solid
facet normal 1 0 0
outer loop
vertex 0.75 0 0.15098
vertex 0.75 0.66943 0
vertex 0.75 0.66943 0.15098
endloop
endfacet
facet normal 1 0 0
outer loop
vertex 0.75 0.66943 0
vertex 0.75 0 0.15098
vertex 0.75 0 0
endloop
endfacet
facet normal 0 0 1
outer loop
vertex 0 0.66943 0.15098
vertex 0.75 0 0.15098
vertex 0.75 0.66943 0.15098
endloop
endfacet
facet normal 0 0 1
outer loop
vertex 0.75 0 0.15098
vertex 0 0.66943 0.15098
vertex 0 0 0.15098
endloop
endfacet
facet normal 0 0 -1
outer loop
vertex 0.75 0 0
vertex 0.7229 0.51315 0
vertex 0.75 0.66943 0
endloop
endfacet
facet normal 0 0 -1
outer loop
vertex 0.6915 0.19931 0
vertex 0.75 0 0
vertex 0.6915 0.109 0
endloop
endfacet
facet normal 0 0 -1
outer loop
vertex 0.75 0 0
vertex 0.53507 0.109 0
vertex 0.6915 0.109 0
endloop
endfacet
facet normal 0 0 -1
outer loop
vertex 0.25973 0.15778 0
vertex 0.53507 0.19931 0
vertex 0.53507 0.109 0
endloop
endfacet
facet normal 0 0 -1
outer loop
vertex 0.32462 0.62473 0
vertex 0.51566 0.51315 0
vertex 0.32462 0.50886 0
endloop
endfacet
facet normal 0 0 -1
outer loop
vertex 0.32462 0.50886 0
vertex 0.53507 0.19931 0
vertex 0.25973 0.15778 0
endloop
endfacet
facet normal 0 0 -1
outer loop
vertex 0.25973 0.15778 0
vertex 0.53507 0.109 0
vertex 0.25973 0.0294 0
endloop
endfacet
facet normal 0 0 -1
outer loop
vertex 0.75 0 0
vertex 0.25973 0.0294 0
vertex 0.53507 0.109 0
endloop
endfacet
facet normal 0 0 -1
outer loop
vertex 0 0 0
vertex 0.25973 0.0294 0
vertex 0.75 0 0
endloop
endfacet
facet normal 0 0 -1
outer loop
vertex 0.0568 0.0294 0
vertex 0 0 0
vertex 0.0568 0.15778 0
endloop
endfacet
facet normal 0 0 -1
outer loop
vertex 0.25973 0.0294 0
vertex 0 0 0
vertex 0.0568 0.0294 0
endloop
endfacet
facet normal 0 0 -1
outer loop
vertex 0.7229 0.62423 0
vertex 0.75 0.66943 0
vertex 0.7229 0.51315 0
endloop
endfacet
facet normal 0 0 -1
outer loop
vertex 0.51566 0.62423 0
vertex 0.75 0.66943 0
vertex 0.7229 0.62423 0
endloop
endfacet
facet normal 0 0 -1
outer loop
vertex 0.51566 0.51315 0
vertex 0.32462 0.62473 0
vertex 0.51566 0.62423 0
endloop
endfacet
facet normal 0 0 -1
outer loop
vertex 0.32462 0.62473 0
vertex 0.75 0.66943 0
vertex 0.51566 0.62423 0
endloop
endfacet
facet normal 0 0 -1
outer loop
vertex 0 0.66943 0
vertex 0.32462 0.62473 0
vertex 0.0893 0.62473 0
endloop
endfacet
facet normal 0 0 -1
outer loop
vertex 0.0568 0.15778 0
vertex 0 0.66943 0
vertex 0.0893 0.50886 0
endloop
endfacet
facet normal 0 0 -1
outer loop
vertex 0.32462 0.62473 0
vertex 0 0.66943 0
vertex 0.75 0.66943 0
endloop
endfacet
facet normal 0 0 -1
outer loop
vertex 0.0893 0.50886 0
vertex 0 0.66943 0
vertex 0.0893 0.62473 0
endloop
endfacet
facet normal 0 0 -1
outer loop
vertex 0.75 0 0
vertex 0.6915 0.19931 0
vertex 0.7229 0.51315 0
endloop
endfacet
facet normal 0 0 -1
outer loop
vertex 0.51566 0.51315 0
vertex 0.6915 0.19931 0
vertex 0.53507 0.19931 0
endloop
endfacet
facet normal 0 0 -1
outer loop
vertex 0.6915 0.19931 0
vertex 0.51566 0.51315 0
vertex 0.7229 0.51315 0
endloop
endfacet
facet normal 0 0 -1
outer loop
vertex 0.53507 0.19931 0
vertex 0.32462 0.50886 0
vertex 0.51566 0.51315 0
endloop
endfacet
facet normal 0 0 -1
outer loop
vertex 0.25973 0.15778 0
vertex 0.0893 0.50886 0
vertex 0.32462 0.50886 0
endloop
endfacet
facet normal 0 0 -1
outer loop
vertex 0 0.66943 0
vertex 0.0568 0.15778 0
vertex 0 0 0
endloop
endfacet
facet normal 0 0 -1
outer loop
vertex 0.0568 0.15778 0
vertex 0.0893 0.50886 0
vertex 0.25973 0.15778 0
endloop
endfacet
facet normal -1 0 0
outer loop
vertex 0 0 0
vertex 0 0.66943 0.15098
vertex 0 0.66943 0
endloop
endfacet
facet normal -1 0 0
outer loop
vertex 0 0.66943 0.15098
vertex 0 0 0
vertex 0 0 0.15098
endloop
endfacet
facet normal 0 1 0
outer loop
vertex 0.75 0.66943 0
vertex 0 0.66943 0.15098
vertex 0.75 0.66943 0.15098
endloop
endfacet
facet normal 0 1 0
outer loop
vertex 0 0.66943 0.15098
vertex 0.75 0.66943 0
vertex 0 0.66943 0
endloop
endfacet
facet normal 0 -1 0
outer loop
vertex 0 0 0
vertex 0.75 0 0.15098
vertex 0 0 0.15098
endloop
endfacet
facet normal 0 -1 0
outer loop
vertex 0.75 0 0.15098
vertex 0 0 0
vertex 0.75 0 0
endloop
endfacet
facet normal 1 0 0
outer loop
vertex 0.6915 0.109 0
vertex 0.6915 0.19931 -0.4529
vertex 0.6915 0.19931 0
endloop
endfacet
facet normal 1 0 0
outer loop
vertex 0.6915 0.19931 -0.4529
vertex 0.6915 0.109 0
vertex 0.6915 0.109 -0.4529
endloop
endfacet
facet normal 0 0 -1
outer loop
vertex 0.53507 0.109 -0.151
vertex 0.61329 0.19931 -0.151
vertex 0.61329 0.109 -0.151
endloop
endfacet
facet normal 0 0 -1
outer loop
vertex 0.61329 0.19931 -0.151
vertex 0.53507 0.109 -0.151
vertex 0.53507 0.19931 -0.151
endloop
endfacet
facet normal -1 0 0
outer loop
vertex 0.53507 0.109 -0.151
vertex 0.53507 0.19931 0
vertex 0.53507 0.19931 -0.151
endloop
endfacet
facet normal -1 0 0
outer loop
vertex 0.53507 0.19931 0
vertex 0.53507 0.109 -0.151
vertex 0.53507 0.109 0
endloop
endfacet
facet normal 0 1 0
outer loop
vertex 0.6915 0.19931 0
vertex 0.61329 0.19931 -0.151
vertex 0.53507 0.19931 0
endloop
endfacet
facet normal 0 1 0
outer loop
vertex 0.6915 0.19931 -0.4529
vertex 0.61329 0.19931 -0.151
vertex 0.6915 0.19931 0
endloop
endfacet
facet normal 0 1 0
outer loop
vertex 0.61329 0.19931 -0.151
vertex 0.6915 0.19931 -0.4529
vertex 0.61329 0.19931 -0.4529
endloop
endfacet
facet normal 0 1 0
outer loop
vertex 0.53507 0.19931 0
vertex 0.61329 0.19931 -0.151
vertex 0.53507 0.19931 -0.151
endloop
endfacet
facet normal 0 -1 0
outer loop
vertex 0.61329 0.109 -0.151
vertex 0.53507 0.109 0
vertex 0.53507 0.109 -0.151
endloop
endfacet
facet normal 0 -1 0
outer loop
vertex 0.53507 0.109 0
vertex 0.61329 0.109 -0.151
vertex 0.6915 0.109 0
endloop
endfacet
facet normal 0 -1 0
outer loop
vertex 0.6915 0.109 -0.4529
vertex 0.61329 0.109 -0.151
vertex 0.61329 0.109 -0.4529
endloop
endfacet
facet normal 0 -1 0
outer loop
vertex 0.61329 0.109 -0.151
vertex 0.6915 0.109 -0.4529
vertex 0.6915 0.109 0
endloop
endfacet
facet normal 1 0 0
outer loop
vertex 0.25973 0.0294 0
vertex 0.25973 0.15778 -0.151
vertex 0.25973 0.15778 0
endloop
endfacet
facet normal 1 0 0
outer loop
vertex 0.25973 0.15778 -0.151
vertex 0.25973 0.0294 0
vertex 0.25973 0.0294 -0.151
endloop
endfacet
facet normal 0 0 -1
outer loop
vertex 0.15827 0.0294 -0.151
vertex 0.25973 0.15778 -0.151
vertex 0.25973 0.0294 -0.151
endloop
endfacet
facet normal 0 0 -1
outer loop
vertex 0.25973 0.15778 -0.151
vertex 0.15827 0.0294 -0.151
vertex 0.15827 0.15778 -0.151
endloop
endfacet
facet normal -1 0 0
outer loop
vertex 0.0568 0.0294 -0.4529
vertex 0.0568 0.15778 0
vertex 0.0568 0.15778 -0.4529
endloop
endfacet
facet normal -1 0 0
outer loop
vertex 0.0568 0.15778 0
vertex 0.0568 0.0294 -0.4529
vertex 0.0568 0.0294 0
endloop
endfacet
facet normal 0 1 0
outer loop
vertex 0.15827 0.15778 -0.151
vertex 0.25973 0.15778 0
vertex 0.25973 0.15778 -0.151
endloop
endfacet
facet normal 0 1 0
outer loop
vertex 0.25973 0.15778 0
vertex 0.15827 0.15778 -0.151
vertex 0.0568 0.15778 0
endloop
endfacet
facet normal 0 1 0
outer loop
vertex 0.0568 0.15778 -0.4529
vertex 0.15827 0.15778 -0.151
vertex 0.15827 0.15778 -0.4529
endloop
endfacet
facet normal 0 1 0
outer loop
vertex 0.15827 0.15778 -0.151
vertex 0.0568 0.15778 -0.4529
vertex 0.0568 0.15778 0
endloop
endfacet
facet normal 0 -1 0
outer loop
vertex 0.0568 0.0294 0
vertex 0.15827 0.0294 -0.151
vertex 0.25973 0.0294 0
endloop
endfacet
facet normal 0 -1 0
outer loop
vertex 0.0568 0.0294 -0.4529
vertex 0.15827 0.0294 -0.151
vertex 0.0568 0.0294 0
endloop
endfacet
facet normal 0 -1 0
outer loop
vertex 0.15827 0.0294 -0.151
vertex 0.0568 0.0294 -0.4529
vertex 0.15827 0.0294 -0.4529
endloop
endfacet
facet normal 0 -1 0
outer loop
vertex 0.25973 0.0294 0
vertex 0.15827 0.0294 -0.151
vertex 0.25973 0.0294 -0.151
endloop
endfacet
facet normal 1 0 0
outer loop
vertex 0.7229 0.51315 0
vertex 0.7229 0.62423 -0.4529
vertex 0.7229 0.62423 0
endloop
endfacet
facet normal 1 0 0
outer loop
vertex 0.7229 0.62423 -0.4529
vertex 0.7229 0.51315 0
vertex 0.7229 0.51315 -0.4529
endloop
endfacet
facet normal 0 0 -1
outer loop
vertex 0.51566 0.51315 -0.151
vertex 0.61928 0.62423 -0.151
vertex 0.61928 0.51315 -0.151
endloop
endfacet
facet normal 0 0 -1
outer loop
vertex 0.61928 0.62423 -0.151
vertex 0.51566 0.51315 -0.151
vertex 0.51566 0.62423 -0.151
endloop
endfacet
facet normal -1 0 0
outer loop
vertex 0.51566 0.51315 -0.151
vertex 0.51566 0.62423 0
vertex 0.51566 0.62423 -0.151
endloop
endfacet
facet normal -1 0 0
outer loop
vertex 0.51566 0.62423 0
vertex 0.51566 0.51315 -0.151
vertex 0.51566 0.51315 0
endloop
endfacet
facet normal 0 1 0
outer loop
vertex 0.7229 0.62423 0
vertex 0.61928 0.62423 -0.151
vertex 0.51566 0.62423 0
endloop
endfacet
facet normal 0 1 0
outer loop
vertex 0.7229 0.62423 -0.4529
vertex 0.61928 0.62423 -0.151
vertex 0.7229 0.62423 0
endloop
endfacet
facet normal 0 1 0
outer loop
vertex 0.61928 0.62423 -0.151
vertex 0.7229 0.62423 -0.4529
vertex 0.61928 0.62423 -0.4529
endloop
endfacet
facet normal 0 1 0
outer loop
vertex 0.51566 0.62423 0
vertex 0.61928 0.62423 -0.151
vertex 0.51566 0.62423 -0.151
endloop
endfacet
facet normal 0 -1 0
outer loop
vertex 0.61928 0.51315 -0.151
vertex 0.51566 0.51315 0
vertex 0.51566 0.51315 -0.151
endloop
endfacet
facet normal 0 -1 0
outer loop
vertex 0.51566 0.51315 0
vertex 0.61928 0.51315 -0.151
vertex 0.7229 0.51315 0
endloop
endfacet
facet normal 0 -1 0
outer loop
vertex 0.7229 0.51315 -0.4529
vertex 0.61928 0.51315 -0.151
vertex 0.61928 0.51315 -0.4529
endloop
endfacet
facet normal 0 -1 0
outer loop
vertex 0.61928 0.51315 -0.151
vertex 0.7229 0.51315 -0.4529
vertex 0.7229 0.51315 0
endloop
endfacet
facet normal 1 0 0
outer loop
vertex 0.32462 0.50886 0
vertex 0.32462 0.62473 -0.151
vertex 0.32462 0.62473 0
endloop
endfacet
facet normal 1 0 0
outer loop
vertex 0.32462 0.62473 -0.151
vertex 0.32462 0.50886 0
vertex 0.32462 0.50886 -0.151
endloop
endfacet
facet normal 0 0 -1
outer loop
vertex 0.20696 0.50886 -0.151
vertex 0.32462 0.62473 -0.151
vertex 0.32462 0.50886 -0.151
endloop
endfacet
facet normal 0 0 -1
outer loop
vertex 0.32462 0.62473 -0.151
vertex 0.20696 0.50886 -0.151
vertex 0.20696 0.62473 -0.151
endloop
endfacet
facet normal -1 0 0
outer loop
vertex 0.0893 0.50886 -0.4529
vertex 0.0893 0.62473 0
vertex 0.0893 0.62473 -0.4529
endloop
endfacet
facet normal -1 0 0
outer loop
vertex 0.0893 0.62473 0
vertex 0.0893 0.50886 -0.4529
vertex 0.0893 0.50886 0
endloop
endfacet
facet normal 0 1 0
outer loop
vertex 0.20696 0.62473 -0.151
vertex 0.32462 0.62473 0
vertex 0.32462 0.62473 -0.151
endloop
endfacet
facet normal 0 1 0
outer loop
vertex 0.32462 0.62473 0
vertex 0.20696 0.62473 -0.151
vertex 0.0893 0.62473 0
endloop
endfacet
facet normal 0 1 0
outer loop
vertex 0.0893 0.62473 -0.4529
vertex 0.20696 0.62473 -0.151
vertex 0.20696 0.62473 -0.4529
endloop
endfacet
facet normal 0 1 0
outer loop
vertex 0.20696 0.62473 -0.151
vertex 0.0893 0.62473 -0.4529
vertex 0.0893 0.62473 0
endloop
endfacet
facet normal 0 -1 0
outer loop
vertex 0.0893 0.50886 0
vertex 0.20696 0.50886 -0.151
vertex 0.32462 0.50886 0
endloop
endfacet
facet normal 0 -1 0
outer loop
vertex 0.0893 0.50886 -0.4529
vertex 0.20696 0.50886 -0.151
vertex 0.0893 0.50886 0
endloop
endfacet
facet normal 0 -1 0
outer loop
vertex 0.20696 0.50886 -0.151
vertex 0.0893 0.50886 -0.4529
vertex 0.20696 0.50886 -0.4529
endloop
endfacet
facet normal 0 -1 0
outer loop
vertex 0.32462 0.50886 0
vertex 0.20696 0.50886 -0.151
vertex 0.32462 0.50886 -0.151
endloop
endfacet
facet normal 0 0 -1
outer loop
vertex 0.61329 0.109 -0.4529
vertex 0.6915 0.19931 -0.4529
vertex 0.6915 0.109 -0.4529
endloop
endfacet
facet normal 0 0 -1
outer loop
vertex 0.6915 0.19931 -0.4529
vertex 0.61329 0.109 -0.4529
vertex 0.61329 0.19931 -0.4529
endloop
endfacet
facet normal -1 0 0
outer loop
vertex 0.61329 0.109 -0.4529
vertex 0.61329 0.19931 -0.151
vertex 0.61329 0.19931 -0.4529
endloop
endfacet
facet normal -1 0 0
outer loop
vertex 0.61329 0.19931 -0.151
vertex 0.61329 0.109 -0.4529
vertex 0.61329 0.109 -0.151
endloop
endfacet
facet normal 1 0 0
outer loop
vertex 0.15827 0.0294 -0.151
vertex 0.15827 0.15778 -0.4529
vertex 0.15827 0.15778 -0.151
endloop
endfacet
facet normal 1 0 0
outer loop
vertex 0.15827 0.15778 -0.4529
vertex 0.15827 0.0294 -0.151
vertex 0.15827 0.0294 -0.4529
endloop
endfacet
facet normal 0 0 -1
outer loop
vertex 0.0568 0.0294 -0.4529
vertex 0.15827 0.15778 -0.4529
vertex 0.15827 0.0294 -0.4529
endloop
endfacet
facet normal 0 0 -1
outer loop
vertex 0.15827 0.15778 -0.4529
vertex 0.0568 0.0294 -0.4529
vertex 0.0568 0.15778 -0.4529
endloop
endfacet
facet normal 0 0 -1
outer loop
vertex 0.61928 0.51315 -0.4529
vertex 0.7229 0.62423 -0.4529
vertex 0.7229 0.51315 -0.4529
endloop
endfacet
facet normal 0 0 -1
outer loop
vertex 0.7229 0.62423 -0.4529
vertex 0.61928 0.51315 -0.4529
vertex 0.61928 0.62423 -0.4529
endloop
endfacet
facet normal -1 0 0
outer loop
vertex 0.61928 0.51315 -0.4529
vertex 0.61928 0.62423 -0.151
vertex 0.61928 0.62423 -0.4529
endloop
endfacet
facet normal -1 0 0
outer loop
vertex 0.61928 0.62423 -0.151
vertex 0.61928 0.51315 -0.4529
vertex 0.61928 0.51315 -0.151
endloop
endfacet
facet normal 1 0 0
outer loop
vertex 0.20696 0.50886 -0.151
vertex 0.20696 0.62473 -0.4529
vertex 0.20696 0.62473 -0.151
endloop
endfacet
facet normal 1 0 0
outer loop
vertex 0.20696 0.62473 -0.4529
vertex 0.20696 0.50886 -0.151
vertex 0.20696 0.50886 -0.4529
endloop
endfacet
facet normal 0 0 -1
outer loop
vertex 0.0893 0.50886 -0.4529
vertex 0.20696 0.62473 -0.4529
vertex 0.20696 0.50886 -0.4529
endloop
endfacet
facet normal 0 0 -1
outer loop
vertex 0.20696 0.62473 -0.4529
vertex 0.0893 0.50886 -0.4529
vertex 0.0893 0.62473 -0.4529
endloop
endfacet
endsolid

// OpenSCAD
// Parameters
$fn = 32;
join_overlap = 0.00001;

// Base dimensions
base_length = 0.75;
base_width = 0.669426;
base_height = 0.150979;
base_main_depth = 0.151;

// Z references: left/front/underside corner is [0,0,0]
base_underside_z = 0;
shallow_pad_depth = base_main_depth;
shallow_top_z = base_underside_z;
shallow_bottom_z = base_underside_z - shallow_pad_depth;

deep_start_below_underside = 0.1509;
deep_continuation_depth = 0.302;
deep_reach_below_underside = deep_start_below_underside + deep_continuation_depth; // 0.4529
deep_top_z = base_underside_z - deep_start_below_underside;
deep_bottom_z = base_underside_z - deep_reach_below_underside;

// Shallow pad 1
p1_sx = 0.156427;
p1_sy = 0.090313;
p1_left = 0.5351;
p1_right = 0.0585;
p1_front = 0.109;
p1_back = 0.4701;

// Shallow pad 2
p2_sx = 0.202932;
p2_sy = 0.128382;
p2_left = 0.0568;
p2_right = 0.4903;
p2_front = 0.0294;
p2_back = 0.5116;

// Shallow pad 3
p3_sx = 0.207237;
p3_sy = 0.111076;
p3_left = 0.5157;
p3_right = 0.0271;
p3_front = 0.5131;
p3_back = 0.0452;

// Shallow pad 4
p4_sx = 0.235324;
p4_sy = 0.115862;
p4_left = 0.0893;
p4_right = 0.4254;
p4_front = 0.5088;
p4_back = 0.0447;

// Deep continuation 1
p1d_sx = 0.078214;
p1d_sy = 0.090313;
p1d_left = 0.6133;
p1d_right = 0.0585;
p1d_front = 0.109;
p1d_back = 0.4701;

// Deep continuation 2
p2d_sx = 0.101466;
p2d_sy = 0.128382;
p2d_left = 0.0568;
p2d_right = 0.5917;
p2d_front = 0.0294;
p2d_back = 0.5116;

// Deep continuation 3
p3d_sx = 0.103619;
p3d_sy = 0.111076;
p3d_left = 0.6193;
p3d_right = 0.0271;
p3d_front = 0.5131;
p3d_back = 0.0452;

// Deep continuation 4
p4d_sx = 0.117662;
p4d_sy = 0.115862;
p4d_left = 0.0893;
p4d_right = 0.543;
p4d_front = 0.5088;
p4d_back = 0.0447;

// Base body
module base_body() {
    cube([base_length, base_width, base_height], center=false);
}

// Rectangular underside addition
module rectangular_feature(
    sx, sy,
    left_offset, right_offset,
    front_offset, back_offset,
    z_top, z_bottom,
    anchor_right=false,
    anchor_back=false,
    overlap_top=0
) {
    x0 = anchor_right ? base_length - right_offset - sx : left_offset;
    y0 = anchor_back ? base_width - back_offset - sy : front_offset;

    translate([x0, y0, z_bottom])
        cube([sx, sy, (z_top - z_bottom) + overlap_top], center=false);
}

// Main model
union() {
    // Reference base
    base_body();

    // Shallow underside pads
    rectangular_feature(p1_sx, p1_sy, p1_left, p1_right, p1_front, p1_back, shallow_top_z, shallow_bottom_z, true,  false, join_overlap);
    rectangular_feature(p2_sx, p2_sy, p2_left, p2_right, p2_front, p2_back, shallow_top_z, shallow_bottom_z, false, false, join_overlap);
    rectangular_feature(p3_sx, p3_sy, p3_left, p3_right, p3_front, p3_back, shallow_top_z, shallow_bottom_z, true,  true,  join_overlap);
    rectangular_feature(p4_sx, p4_sy, p4_left, p4_right, p4_front, p4_back, shallow_top_z, shallow_bottom_z, false, true,  join_overlap);

    // Deeper continuations
    rectangular_feature(p1d_sx, p1d_sy, p1d_left, p1d_right, p1d_front, p1d_back, deep_top_z, deep_bottom_z, true,  false, 0);
    rectangular_feature(p2d_sx, p2d_sy, p2d_left, p2d_right, p2d_front, p2d_back, deep_top_z, deep_bottom_z, false, false, 0);
    rectangular_feature(p3d_sx, p3d_sy, p3d_left, p3d_right, p3d_front, p3d_back, deep_top_z, deep_bottom_z, true,  true,  0);
    rectangular_feature(p4d_sx, p4d_sy, p4d_left, p4d_right, p4d_front, p4d_back, deep_top_z, deep_bottom_z, false, true,  0);
}
